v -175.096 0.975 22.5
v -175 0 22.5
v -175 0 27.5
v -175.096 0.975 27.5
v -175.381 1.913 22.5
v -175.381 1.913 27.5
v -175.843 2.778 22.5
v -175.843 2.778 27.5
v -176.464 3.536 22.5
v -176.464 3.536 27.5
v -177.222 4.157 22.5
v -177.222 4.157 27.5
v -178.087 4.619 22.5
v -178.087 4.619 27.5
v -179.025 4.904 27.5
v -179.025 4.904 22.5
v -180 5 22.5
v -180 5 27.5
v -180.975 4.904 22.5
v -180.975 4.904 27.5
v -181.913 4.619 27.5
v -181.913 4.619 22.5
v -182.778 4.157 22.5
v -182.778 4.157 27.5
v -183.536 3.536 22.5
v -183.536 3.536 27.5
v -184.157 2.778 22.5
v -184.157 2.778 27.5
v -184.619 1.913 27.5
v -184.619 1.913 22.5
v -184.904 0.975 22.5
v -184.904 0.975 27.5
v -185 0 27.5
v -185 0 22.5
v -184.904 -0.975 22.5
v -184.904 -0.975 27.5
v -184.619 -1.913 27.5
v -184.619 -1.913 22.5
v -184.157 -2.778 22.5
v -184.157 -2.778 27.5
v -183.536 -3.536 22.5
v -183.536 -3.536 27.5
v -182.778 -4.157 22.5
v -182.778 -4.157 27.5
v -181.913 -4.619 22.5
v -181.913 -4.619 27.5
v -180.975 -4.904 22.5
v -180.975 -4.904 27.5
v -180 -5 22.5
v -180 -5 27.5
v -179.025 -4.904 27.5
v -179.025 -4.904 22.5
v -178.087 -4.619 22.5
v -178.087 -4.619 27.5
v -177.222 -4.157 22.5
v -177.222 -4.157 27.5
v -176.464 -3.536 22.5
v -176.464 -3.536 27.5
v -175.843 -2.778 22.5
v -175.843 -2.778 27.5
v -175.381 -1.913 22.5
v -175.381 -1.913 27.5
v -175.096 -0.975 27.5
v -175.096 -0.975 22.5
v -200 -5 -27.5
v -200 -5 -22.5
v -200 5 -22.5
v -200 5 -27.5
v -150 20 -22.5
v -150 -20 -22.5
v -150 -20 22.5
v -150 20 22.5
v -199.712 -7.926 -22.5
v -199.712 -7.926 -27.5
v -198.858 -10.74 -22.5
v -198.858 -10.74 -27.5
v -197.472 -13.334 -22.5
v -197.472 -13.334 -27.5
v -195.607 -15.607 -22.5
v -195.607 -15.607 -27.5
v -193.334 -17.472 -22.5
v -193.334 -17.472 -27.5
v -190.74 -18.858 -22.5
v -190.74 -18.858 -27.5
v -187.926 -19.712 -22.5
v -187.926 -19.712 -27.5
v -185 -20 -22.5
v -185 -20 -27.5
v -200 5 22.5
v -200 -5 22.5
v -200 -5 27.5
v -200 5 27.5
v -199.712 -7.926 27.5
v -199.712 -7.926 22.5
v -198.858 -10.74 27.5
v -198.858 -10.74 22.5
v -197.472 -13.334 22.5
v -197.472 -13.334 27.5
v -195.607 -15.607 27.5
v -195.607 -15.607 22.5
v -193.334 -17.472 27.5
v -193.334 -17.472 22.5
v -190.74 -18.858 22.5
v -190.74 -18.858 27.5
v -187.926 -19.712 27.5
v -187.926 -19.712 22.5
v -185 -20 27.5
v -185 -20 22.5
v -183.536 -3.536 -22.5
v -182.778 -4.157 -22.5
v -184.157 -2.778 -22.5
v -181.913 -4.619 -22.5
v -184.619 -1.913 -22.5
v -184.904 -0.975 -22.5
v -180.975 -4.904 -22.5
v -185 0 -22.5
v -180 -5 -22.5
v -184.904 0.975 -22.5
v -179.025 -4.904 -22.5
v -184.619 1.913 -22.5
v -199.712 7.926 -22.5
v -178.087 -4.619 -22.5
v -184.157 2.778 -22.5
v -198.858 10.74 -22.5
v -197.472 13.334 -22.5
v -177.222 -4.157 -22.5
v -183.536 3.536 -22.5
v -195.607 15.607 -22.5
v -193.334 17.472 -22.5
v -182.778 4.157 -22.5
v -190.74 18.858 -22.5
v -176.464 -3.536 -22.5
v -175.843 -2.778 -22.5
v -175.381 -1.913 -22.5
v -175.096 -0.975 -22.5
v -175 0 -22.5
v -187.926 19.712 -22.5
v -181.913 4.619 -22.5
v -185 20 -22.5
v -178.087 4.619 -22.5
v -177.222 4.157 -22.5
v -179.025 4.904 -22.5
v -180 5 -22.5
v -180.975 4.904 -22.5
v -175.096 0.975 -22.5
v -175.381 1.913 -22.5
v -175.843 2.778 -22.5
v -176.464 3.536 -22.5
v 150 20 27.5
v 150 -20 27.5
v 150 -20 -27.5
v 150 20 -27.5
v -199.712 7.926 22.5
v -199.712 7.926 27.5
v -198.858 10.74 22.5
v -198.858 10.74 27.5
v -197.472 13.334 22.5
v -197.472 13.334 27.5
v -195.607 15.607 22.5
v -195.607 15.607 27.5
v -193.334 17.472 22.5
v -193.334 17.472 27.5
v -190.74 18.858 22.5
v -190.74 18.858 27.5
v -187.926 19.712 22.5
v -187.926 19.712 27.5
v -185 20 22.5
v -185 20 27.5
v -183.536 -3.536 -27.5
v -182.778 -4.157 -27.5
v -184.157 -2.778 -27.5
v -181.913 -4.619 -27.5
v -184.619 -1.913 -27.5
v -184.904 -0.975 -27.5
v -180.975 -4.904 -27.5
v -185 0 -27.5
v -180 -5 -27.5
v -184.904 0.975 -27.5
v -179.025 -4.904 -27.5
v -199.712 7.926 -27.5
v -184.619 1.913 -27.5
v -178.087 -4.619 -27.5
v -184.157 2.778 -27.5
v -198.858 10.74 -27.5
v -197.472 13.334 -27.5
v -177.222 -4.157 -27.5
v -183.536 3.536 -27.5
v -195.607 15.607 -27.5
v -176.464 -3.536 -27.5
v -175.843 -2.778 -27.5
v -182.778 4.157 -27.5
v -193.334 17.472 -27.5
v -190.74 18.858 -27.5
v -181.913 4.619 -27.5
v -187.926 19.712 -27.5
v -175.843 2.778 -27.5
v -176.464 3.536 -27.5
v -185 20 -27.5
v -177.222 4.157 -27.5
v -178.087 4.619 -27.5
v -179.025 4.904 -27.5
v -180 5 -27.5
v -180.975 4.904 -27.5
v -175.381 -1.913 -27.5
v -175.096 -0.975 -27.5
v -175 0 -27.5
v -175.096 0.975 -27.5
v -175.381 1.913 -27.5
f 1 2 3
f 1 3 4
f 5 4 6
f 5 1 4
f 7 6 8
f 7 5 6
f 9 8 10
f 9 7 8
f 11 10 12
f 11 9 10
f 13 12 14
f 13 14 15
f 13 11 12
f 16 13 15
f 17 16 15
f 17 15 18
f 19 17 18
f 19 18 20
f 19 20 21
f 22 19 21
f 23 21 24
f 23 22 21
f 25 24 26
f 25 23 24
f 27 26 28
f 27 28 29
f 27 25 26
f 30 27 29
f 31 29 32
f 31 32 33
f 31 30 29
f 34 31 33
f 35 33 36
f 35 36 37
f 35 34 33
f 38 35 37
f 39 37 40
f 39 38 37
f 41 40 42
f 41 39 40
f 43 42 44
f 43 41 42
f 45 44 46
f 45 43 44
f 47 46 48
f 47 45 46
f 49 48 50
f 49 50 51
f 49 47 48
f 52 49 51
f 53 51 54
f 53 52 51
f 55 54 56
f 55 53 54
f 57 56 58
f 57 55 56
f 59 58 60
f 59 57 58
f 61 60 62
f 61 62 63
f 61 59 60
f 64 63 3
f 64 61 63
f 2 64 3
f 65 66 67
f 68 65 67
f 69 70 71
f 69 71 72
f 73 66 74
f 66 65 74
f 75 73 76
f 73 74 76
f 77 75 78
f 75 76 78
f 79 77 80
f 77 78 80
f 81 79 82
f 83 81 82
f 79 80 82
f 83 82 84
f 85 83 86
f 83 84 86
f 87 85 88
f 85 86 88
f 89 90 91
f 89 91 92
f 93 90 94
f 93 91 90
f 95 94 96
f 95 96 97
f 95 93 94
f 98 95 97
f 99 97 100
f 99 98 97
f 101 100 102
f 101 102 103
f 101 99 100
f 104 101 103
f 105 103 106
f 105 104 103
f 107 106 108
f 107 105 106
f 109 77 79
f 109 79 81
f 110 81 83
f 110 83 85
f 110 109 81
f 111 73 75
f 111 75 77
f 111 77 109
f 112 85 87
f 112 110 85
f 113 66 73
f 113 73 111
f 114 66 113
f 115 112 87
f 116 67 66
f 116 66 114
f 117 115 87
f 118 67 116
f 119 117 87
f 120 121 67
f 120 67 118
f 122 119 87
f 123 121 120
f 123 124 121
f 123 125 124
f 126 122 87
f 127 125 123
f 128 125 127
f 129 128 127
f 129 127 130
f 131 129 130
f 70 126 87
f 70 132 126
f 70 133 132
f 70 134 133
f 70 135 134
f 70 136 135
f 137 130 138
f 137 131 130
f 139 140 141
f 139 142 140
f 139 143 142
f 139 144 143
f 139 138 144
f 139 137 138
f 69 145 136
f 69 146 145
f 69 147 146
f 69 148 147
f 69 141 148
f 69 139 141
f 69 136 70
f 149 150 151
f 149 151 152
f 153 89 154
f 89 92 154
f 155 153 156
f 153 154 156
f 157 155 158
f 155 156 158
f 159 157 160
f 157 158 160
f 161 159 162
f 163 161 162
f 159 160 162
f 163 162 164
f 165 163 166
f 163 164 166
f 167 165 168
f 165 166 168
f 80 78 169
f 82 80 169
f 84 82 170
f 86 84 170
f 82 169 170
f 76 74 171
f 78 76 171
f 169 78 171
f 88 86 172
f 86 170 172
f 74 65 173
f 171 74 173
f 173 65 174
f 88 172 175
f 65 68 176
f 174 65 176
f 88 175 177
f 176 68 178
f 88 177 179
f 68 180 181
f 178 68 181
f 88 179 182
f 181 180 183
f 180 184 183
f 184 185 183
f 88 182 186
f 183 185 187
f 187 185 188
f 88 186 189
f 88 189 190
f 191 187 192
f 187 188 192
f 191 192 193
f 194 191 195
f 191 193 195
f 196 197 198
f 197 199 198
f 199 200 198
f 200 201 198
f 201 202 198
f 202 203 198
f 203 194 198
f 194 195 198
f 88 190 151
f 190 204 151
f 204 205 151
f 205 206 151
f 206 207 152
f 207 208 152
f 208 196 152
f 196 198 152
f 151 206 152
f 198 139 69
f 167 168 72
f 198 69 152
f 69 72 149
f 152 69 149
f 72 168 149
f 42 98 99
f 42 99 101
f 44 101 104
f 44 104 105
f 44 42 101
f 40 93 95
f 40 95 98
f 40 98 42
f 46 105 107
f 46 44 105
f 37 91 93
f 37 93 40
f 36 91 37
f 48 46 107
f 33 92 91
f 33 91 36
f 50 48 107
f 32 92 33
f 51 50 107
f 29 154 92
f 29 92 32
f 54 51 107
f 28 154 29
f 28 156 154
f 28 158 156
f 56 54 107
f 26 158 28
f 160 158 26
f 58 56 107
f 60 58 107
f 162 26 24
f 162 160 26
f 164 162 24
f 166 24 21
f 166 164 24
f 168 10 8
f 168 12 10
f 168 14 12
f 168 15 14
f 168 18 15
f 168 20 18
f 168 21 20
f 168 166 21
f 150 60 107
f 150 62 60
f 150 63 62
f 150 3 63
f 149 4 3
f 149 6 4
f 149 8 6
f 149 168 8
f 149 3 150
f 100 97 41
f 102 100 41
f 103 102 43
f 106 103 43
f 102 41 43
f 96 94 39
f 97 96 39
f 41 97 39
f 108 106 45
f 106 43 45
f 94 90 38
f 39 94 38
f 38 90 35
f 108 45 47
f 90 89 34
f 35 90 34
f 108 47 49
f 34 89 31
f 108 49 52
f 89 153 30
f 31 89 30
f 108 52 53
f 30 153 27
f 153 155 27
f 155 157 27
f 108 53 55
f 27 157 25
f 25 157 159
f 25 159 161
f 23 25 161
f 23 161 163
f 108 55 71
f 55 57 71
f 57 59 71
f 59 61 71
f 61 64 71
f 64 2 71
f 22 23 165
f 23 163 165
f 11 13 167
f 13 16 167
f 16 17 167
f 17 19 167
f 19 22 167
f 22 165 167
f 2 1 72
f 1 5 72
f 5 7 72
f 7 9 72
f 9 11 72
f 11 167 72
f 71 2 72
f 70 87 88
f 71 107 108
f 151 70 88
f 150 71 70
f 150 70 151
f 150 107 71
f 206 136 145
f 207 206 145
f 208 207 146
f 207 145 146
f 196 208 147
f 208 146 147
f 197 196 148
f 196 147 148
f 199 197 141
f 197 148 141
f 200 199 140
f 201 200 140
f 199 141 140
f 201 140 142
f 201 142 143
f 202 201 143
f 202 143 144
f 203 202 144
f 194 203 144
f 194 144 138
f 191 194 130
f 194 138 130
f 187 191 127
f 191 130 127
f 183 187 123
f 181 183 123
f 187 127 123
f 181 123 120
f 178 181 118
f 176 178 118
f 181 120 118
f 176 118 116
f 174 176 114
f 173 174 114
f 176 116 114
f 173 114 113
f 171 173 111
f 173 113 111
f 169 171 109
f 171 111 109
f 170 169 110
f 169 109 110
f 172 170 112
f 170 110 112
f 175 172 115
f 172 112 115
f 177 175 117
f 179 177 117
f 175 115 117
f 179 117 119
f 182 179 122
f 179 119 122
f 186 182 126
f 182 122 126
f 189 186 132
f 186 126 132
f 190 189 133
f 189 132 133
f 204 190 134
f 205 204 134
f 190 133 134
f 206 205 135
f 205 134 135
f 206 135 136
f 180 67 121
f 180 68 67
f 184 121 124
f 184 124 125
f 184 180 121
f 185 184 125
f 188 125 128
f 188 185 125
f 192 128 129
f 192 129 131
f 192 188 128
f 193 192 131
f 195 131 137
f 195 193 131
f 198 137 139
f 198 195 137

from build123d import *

# Parameters (mm, degrees)
SKETCH1_W            = 300
SKETCH1_H            = 40
BOSS_EXTRUDE1_DEPTH  = 22.5
SKETCH2_W            = 350
SKETCH2_H            = 40
SKETCH2_R            = 5
BOSS_EXTRUDE2_DEPTH  = 5
FILLET1_R            = 15
FILLET1_OF_MIRROR1_R = 15


with BuildPart() as part:
    # Sketch1 → Boss-Extrude1 (new, symmetric)
    with BuildSketch(Plane.XY):
        Rectangle(SKETCH1_W, SKETCH1_H)
    extrude(amount=BOSS_EXTRUDE1_DEPTH, both=True)

    # Sketch2 → Boss-Extrude2 (add)
    with BuildSketch(Plane.XY.offset(22.5)):
        with Locations((-25, 0)):
            Rectangle(SKETCH2_W, SKETCH2_H)
        with Locations((-180, 0)):
            Circle(SKETCH2_R, mode=Mode.SUBTRACT)
    boss_extrude2 = extrude(amount=BOSS_EXTRUDE2_DEPTH)

    # Fillet1
    fillet1_edges = [part.edges().sort_by_distance(p)[0] for p in [
        (-200, -20, 25),
        (-200, 20, 25),
    ]]
    fillet(fillet1_edges, radius=FILLET1_R)

    # Mirror1: Boss-Extrude2 across plane
    add(boss_extrude2.mirror(Plane.XY))

    # Fillet1 of Mirror1
    fillet1_of_mirror1_edges = [part.edges().sort_by_distance(p)[0] for p in [
        (-200, -20, -25),
        (-200, 20, -25),
    ]]
    fillet(fillet1_of_mirror1_edges, radius=FILLET1_OF_MIRROR1_R)


solid = part.part
